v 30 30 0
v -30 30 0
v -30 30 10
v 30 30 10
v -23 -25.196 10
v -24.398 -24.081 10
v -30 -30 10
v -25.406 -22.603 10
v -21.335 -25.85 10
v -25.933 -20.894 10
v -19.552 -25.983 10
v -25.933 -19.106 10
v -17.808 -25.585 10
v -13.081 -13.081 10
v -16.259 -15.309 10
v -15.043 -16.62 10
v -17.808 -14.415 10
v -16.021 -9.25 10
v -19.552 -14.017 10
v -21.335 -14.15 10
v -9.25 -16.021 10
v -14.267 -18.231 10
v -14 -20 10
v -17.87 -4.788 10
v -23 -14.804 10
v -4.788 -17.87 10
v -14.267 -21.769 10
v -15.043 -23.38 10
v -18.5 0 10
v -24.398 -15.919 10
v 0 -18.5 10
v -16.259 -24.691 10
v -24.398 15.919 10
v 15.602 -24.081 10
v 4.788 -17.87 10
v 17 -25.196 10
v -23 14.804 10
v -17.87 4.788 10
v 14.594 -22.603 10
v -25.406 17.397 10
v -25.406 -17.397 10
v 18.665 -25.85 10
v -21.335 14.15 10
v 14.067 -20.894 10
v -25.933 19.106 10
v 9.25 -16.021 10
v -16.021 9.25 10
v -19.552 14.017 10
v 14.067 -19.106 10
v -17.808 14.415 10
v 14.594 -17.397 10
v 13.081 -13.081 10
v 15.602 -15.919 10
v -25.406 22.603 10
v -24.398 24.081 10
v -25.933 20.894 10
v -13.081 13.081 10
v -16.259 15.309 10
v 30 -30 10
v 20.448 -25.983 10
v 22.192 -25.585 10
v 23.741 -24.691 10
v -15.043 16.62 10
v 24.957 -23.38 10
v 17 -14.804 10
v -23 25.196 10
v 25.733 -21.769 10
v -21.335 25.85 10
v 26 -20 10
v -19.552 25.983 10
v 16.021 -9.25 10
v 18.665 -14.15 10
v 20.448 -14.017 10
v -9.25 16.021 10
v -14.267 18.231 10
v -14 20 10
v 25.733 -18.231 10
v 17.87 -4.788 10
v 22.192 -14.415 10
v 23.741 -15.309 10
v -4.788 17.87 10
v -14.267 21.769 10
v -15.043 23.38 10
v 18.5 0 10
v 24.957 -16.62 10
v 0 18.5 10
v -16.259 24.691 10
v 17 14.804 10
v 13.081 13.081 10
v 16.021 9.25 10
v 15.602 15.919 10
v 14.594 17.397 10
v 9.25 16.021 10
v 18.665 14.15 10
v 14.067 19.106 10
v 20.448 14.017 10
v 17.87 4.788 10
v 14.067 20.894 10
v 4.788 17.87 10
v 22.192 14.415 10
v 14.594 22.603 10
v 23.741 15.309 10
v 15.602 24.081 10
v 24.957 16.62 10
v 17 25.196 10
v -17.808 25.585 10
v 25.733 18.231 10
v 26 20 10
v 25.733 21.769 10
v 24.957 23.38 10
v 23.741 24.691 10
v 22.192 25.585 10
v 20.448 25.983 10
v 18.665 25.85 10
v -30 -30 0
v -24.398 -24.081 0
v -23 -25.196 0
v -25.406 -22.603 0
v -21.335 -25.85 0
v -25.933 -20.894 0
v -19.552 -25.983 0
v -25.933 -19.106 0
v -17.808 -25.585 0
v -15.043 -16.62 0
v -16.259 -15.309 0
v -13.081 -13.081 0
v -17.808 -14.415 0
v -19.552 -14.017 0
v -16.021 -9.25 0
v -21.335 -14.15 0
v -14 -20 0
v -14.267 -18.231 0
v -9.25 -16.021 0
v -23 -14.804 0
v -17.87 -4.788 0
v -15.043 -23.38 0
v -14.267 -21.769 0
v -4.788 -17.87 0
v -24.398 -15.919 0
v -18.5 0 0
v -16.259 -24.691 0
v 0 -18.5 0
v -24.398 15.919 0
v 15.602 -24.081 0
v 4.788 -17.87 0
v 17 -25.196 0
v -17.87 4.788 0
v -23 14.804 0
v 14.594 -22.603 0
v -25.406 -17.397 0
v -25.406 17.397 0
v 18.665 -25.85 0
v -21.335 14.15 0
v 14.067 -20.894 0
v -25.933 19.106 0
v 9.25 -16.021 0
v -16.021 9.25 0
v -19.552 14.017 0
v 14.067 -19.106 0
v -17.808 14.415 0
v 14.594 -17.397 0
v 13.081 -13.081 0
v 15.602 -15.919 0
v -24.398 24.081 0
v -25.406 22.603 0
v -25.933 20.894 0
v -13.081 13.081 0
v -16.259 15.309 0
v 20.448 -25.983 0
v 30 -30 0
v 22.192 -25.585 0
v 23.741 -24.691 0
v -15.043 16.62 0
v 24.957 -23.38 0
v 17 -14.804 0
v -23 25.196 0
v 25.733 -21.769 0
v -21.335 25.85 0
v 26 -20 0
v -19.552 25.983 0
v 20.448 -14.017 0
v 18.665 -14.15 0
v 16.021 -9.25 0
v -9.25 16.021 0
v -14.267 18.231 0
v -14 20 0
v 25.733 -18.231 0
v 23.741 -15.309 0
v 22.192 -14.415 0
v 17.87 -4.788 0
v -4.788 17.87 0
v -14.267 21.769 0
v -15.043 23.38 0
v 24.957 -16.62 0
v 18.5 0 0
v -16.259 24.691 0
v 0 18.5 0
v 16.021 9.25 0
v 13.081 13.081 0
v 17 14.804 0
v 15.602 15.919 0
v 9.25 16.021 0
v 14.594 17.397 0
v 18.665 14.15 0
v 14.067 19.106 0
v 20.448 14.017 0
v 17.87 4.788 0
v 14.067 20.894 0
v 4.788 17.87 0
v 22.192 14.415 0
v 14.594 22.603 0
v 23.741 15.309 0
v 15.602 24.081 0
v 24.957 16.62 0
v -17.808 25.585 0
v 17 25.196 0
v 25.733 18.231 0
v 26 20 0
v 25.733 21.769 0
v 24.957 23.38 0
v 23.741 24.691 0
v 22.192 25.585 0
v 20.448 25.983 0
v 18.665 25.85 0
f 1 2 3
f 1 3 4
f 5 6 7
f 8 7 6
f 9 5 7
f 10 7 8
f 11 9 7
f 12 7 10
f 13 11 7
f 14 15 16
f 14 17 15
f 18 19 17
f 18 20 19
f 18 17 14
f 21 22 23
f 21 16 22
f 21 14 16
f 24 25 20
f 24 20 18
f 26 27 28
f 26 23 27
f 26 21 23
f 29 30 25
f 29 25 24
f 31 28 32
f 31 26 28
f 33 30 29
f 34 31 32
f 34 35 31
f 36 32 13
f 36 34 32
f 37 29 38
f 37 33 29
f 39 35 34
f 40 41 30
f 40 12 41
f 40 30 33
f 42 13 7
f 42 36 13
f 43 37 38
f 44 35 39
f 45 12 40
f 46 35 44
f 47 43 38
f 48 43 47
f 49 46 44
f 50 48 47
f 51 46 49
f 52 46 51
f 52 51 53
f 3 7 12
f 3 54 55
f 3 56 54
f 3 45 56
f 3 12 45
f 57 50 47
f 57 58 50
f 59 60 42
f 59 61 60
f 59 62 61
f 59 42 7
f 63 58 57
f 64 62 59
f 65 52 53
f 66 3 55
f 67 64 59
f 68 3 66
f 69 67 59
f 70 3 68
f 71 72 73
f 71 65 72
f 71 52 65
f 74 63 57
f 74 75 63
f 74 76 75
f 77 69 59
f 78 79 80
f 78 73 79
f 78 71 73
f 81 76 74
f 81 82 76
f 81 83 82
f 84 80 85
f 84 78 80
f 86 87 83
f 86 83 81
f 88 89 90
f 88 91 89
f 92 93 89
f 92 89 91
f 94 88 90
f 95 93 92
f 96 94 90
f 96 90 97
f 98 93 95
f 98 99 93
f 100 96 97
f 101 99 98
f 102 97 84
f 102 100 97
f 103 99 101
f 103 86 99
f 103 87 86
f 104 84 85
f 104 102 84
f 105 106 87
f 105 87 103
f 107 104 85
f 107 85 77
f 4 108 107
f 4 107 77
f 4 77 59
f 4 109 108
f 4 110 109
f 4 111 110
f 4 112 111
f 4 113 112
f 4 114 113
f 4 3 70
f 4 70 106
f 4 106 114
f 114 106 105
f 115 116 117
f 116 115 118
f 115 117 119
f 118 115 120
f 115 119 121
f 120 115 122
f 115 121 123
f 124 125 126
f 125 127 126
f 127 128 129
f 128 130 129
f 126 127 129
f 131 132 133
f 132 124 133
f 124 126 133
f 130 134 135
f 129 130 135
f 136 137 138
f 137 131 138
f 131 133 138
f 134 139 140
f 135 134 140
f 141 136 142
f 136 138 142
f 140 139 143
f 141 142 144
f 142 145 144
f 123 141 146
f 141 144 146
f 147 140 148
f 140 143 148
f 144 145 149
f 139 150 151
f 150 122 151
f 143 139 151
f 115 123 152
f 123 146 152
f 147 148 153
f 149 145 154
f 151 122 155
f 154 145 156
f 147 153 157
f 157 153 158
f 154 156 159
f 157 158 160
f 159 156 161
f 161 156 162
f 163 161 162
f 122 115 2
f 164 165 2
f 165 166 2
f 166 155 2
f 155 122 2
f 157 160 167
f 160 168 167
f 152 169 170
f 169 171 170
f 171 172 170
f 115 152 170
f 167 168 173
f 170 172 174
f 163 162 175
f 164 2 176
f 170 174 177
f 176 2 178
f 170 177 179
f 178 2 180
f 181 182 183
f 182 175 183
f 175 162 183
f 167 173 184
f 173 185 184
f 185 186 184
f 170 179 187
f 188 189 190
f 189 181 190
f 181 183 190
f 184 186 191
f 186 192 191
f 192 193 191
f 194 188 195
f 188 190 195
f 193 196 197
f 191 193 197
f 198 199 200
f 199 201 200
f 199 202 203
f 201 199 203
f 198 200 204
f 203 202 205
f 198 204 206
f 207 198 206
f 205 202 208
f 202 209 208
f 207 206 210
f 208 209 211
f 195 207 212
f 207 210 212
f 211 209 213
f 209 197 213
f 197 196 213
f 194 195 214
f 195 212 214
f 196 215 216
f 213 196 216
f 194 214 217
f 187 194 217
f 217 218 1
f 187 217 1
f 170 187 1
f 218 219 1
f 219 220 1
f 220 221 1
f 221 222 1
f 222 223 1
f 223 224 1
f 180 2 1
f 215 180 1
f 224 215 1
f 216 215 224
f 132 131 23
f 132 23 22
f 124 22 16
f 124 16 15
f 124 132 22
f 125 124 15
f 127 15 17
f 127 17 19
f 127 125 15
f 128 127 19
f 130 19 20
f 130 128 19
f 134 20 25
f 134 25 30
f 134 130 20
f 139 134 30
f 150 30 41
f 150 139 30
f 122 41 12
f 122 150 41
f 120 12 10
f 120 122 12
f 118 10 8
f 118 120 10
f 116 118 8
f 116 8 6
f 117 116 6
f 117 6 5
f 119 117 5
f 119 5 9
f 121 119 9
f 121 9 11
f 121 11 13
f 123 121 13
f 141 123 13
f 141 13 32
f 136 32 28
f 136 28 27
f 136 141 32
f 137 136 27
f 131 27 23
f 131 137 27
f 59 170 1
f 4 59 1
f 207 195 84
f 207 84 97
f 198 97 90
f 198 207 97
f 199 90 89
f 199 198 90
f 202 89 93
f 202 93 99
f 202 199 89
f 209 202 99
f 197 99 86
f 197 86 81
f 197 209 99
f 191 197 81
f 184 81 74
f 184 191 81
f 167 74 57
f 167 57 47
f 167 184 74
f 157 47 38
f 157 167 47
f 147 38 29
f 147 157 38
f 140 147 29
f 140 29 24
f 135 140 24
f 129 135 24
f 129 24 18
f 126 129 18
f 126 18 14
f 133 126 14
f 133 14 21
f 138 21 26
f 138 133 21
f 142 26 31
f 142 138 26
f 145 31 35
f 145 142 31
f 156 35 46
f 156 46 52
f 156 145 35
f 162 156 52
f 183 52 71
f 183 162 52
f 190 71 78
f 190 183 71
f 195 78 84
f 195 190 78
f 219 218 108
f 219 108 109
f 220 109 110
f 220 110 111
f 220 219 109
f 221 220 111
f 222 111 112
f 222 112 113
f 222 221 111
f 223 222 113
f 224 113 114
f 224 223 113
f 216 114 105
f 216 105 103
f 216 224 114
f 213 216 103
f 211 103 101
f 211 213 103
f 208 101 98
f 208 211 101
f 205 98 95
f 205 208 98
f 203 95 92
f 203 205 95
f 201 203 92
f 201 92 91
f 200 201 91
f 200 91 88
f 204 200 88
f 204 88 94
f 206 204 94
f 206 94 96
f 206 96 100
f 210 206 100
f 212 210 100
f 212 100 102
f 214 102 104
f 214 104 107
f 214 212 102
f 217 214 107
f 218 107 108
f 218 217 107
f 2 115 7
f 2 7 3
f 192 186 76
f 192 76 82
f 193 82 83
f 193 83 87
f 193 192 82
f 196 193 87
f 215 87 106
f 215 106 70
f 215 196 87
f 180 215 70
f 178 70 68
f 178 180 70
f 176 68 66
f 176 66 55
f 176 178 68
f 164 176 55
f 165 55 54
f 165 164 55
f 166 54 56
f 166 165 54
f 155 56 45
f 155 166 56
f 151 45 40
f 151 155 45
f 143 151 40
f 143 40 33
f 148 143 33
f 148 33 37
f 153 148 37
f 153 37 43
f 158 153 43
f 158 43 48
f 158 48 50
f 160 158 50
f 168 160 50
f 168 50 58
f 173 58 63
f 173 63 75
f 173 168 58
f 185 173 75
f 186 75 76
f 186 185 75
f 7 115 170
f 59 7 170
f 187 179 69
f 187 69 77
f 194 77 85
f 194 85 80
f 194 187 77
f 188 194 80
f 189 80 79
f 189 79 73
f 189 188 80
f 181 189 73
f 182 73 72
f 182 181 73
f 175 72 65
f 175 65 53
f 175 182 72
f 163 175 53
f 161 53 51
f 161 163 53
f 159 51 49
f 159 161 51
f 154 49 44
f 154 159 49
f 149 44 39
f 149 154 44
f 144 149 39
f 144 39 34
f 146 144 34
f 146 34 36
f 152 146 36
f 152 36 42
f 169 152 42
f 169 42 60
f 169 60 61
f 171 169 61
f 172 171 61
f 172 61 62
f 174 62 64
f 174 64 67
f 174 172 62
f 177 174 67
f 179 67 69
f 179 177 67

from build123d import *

# Parameters (mm, degrees)
IZIM1_W                     = 60
IZIM1_H                     = 60
IZIM1_R                     = 18.5
IZIM1_R_2                   = 6
Y_KSEKLIK_EKSTR_ZYON1_DEPTH = 10


with BuildPart() as part:
    # Çizim1 → Yükseklik-Ekstrüzyon1 (new body)
    with BuildSketch(Plane.XY):
        Rectangle(IZIM1_W, IZIM1_H)
        Circle(IZIM1_R, mode=Mode.SUBTRACT)
        with Locations((20, 20)):
            Circle(IZIM1_R_2, mode=Mode.SUBTRACT)
        with Locations((-20, 20)):
            Circle(IZIM1_R_2, mode=Mode.SUBTRACT)
        with Locations((20, -20)):
            Circle(IZIM1_R_2, mode=Mode.SUBTRACT)
        with Locations((-20, -20)):
            Circle(IZIM1_R_2, mode=Mode.SUBTRACT)
    extrude(amount=Y_KSEKLIK_EKSTR_ZYON1_DEPTH)


solid = part.part
